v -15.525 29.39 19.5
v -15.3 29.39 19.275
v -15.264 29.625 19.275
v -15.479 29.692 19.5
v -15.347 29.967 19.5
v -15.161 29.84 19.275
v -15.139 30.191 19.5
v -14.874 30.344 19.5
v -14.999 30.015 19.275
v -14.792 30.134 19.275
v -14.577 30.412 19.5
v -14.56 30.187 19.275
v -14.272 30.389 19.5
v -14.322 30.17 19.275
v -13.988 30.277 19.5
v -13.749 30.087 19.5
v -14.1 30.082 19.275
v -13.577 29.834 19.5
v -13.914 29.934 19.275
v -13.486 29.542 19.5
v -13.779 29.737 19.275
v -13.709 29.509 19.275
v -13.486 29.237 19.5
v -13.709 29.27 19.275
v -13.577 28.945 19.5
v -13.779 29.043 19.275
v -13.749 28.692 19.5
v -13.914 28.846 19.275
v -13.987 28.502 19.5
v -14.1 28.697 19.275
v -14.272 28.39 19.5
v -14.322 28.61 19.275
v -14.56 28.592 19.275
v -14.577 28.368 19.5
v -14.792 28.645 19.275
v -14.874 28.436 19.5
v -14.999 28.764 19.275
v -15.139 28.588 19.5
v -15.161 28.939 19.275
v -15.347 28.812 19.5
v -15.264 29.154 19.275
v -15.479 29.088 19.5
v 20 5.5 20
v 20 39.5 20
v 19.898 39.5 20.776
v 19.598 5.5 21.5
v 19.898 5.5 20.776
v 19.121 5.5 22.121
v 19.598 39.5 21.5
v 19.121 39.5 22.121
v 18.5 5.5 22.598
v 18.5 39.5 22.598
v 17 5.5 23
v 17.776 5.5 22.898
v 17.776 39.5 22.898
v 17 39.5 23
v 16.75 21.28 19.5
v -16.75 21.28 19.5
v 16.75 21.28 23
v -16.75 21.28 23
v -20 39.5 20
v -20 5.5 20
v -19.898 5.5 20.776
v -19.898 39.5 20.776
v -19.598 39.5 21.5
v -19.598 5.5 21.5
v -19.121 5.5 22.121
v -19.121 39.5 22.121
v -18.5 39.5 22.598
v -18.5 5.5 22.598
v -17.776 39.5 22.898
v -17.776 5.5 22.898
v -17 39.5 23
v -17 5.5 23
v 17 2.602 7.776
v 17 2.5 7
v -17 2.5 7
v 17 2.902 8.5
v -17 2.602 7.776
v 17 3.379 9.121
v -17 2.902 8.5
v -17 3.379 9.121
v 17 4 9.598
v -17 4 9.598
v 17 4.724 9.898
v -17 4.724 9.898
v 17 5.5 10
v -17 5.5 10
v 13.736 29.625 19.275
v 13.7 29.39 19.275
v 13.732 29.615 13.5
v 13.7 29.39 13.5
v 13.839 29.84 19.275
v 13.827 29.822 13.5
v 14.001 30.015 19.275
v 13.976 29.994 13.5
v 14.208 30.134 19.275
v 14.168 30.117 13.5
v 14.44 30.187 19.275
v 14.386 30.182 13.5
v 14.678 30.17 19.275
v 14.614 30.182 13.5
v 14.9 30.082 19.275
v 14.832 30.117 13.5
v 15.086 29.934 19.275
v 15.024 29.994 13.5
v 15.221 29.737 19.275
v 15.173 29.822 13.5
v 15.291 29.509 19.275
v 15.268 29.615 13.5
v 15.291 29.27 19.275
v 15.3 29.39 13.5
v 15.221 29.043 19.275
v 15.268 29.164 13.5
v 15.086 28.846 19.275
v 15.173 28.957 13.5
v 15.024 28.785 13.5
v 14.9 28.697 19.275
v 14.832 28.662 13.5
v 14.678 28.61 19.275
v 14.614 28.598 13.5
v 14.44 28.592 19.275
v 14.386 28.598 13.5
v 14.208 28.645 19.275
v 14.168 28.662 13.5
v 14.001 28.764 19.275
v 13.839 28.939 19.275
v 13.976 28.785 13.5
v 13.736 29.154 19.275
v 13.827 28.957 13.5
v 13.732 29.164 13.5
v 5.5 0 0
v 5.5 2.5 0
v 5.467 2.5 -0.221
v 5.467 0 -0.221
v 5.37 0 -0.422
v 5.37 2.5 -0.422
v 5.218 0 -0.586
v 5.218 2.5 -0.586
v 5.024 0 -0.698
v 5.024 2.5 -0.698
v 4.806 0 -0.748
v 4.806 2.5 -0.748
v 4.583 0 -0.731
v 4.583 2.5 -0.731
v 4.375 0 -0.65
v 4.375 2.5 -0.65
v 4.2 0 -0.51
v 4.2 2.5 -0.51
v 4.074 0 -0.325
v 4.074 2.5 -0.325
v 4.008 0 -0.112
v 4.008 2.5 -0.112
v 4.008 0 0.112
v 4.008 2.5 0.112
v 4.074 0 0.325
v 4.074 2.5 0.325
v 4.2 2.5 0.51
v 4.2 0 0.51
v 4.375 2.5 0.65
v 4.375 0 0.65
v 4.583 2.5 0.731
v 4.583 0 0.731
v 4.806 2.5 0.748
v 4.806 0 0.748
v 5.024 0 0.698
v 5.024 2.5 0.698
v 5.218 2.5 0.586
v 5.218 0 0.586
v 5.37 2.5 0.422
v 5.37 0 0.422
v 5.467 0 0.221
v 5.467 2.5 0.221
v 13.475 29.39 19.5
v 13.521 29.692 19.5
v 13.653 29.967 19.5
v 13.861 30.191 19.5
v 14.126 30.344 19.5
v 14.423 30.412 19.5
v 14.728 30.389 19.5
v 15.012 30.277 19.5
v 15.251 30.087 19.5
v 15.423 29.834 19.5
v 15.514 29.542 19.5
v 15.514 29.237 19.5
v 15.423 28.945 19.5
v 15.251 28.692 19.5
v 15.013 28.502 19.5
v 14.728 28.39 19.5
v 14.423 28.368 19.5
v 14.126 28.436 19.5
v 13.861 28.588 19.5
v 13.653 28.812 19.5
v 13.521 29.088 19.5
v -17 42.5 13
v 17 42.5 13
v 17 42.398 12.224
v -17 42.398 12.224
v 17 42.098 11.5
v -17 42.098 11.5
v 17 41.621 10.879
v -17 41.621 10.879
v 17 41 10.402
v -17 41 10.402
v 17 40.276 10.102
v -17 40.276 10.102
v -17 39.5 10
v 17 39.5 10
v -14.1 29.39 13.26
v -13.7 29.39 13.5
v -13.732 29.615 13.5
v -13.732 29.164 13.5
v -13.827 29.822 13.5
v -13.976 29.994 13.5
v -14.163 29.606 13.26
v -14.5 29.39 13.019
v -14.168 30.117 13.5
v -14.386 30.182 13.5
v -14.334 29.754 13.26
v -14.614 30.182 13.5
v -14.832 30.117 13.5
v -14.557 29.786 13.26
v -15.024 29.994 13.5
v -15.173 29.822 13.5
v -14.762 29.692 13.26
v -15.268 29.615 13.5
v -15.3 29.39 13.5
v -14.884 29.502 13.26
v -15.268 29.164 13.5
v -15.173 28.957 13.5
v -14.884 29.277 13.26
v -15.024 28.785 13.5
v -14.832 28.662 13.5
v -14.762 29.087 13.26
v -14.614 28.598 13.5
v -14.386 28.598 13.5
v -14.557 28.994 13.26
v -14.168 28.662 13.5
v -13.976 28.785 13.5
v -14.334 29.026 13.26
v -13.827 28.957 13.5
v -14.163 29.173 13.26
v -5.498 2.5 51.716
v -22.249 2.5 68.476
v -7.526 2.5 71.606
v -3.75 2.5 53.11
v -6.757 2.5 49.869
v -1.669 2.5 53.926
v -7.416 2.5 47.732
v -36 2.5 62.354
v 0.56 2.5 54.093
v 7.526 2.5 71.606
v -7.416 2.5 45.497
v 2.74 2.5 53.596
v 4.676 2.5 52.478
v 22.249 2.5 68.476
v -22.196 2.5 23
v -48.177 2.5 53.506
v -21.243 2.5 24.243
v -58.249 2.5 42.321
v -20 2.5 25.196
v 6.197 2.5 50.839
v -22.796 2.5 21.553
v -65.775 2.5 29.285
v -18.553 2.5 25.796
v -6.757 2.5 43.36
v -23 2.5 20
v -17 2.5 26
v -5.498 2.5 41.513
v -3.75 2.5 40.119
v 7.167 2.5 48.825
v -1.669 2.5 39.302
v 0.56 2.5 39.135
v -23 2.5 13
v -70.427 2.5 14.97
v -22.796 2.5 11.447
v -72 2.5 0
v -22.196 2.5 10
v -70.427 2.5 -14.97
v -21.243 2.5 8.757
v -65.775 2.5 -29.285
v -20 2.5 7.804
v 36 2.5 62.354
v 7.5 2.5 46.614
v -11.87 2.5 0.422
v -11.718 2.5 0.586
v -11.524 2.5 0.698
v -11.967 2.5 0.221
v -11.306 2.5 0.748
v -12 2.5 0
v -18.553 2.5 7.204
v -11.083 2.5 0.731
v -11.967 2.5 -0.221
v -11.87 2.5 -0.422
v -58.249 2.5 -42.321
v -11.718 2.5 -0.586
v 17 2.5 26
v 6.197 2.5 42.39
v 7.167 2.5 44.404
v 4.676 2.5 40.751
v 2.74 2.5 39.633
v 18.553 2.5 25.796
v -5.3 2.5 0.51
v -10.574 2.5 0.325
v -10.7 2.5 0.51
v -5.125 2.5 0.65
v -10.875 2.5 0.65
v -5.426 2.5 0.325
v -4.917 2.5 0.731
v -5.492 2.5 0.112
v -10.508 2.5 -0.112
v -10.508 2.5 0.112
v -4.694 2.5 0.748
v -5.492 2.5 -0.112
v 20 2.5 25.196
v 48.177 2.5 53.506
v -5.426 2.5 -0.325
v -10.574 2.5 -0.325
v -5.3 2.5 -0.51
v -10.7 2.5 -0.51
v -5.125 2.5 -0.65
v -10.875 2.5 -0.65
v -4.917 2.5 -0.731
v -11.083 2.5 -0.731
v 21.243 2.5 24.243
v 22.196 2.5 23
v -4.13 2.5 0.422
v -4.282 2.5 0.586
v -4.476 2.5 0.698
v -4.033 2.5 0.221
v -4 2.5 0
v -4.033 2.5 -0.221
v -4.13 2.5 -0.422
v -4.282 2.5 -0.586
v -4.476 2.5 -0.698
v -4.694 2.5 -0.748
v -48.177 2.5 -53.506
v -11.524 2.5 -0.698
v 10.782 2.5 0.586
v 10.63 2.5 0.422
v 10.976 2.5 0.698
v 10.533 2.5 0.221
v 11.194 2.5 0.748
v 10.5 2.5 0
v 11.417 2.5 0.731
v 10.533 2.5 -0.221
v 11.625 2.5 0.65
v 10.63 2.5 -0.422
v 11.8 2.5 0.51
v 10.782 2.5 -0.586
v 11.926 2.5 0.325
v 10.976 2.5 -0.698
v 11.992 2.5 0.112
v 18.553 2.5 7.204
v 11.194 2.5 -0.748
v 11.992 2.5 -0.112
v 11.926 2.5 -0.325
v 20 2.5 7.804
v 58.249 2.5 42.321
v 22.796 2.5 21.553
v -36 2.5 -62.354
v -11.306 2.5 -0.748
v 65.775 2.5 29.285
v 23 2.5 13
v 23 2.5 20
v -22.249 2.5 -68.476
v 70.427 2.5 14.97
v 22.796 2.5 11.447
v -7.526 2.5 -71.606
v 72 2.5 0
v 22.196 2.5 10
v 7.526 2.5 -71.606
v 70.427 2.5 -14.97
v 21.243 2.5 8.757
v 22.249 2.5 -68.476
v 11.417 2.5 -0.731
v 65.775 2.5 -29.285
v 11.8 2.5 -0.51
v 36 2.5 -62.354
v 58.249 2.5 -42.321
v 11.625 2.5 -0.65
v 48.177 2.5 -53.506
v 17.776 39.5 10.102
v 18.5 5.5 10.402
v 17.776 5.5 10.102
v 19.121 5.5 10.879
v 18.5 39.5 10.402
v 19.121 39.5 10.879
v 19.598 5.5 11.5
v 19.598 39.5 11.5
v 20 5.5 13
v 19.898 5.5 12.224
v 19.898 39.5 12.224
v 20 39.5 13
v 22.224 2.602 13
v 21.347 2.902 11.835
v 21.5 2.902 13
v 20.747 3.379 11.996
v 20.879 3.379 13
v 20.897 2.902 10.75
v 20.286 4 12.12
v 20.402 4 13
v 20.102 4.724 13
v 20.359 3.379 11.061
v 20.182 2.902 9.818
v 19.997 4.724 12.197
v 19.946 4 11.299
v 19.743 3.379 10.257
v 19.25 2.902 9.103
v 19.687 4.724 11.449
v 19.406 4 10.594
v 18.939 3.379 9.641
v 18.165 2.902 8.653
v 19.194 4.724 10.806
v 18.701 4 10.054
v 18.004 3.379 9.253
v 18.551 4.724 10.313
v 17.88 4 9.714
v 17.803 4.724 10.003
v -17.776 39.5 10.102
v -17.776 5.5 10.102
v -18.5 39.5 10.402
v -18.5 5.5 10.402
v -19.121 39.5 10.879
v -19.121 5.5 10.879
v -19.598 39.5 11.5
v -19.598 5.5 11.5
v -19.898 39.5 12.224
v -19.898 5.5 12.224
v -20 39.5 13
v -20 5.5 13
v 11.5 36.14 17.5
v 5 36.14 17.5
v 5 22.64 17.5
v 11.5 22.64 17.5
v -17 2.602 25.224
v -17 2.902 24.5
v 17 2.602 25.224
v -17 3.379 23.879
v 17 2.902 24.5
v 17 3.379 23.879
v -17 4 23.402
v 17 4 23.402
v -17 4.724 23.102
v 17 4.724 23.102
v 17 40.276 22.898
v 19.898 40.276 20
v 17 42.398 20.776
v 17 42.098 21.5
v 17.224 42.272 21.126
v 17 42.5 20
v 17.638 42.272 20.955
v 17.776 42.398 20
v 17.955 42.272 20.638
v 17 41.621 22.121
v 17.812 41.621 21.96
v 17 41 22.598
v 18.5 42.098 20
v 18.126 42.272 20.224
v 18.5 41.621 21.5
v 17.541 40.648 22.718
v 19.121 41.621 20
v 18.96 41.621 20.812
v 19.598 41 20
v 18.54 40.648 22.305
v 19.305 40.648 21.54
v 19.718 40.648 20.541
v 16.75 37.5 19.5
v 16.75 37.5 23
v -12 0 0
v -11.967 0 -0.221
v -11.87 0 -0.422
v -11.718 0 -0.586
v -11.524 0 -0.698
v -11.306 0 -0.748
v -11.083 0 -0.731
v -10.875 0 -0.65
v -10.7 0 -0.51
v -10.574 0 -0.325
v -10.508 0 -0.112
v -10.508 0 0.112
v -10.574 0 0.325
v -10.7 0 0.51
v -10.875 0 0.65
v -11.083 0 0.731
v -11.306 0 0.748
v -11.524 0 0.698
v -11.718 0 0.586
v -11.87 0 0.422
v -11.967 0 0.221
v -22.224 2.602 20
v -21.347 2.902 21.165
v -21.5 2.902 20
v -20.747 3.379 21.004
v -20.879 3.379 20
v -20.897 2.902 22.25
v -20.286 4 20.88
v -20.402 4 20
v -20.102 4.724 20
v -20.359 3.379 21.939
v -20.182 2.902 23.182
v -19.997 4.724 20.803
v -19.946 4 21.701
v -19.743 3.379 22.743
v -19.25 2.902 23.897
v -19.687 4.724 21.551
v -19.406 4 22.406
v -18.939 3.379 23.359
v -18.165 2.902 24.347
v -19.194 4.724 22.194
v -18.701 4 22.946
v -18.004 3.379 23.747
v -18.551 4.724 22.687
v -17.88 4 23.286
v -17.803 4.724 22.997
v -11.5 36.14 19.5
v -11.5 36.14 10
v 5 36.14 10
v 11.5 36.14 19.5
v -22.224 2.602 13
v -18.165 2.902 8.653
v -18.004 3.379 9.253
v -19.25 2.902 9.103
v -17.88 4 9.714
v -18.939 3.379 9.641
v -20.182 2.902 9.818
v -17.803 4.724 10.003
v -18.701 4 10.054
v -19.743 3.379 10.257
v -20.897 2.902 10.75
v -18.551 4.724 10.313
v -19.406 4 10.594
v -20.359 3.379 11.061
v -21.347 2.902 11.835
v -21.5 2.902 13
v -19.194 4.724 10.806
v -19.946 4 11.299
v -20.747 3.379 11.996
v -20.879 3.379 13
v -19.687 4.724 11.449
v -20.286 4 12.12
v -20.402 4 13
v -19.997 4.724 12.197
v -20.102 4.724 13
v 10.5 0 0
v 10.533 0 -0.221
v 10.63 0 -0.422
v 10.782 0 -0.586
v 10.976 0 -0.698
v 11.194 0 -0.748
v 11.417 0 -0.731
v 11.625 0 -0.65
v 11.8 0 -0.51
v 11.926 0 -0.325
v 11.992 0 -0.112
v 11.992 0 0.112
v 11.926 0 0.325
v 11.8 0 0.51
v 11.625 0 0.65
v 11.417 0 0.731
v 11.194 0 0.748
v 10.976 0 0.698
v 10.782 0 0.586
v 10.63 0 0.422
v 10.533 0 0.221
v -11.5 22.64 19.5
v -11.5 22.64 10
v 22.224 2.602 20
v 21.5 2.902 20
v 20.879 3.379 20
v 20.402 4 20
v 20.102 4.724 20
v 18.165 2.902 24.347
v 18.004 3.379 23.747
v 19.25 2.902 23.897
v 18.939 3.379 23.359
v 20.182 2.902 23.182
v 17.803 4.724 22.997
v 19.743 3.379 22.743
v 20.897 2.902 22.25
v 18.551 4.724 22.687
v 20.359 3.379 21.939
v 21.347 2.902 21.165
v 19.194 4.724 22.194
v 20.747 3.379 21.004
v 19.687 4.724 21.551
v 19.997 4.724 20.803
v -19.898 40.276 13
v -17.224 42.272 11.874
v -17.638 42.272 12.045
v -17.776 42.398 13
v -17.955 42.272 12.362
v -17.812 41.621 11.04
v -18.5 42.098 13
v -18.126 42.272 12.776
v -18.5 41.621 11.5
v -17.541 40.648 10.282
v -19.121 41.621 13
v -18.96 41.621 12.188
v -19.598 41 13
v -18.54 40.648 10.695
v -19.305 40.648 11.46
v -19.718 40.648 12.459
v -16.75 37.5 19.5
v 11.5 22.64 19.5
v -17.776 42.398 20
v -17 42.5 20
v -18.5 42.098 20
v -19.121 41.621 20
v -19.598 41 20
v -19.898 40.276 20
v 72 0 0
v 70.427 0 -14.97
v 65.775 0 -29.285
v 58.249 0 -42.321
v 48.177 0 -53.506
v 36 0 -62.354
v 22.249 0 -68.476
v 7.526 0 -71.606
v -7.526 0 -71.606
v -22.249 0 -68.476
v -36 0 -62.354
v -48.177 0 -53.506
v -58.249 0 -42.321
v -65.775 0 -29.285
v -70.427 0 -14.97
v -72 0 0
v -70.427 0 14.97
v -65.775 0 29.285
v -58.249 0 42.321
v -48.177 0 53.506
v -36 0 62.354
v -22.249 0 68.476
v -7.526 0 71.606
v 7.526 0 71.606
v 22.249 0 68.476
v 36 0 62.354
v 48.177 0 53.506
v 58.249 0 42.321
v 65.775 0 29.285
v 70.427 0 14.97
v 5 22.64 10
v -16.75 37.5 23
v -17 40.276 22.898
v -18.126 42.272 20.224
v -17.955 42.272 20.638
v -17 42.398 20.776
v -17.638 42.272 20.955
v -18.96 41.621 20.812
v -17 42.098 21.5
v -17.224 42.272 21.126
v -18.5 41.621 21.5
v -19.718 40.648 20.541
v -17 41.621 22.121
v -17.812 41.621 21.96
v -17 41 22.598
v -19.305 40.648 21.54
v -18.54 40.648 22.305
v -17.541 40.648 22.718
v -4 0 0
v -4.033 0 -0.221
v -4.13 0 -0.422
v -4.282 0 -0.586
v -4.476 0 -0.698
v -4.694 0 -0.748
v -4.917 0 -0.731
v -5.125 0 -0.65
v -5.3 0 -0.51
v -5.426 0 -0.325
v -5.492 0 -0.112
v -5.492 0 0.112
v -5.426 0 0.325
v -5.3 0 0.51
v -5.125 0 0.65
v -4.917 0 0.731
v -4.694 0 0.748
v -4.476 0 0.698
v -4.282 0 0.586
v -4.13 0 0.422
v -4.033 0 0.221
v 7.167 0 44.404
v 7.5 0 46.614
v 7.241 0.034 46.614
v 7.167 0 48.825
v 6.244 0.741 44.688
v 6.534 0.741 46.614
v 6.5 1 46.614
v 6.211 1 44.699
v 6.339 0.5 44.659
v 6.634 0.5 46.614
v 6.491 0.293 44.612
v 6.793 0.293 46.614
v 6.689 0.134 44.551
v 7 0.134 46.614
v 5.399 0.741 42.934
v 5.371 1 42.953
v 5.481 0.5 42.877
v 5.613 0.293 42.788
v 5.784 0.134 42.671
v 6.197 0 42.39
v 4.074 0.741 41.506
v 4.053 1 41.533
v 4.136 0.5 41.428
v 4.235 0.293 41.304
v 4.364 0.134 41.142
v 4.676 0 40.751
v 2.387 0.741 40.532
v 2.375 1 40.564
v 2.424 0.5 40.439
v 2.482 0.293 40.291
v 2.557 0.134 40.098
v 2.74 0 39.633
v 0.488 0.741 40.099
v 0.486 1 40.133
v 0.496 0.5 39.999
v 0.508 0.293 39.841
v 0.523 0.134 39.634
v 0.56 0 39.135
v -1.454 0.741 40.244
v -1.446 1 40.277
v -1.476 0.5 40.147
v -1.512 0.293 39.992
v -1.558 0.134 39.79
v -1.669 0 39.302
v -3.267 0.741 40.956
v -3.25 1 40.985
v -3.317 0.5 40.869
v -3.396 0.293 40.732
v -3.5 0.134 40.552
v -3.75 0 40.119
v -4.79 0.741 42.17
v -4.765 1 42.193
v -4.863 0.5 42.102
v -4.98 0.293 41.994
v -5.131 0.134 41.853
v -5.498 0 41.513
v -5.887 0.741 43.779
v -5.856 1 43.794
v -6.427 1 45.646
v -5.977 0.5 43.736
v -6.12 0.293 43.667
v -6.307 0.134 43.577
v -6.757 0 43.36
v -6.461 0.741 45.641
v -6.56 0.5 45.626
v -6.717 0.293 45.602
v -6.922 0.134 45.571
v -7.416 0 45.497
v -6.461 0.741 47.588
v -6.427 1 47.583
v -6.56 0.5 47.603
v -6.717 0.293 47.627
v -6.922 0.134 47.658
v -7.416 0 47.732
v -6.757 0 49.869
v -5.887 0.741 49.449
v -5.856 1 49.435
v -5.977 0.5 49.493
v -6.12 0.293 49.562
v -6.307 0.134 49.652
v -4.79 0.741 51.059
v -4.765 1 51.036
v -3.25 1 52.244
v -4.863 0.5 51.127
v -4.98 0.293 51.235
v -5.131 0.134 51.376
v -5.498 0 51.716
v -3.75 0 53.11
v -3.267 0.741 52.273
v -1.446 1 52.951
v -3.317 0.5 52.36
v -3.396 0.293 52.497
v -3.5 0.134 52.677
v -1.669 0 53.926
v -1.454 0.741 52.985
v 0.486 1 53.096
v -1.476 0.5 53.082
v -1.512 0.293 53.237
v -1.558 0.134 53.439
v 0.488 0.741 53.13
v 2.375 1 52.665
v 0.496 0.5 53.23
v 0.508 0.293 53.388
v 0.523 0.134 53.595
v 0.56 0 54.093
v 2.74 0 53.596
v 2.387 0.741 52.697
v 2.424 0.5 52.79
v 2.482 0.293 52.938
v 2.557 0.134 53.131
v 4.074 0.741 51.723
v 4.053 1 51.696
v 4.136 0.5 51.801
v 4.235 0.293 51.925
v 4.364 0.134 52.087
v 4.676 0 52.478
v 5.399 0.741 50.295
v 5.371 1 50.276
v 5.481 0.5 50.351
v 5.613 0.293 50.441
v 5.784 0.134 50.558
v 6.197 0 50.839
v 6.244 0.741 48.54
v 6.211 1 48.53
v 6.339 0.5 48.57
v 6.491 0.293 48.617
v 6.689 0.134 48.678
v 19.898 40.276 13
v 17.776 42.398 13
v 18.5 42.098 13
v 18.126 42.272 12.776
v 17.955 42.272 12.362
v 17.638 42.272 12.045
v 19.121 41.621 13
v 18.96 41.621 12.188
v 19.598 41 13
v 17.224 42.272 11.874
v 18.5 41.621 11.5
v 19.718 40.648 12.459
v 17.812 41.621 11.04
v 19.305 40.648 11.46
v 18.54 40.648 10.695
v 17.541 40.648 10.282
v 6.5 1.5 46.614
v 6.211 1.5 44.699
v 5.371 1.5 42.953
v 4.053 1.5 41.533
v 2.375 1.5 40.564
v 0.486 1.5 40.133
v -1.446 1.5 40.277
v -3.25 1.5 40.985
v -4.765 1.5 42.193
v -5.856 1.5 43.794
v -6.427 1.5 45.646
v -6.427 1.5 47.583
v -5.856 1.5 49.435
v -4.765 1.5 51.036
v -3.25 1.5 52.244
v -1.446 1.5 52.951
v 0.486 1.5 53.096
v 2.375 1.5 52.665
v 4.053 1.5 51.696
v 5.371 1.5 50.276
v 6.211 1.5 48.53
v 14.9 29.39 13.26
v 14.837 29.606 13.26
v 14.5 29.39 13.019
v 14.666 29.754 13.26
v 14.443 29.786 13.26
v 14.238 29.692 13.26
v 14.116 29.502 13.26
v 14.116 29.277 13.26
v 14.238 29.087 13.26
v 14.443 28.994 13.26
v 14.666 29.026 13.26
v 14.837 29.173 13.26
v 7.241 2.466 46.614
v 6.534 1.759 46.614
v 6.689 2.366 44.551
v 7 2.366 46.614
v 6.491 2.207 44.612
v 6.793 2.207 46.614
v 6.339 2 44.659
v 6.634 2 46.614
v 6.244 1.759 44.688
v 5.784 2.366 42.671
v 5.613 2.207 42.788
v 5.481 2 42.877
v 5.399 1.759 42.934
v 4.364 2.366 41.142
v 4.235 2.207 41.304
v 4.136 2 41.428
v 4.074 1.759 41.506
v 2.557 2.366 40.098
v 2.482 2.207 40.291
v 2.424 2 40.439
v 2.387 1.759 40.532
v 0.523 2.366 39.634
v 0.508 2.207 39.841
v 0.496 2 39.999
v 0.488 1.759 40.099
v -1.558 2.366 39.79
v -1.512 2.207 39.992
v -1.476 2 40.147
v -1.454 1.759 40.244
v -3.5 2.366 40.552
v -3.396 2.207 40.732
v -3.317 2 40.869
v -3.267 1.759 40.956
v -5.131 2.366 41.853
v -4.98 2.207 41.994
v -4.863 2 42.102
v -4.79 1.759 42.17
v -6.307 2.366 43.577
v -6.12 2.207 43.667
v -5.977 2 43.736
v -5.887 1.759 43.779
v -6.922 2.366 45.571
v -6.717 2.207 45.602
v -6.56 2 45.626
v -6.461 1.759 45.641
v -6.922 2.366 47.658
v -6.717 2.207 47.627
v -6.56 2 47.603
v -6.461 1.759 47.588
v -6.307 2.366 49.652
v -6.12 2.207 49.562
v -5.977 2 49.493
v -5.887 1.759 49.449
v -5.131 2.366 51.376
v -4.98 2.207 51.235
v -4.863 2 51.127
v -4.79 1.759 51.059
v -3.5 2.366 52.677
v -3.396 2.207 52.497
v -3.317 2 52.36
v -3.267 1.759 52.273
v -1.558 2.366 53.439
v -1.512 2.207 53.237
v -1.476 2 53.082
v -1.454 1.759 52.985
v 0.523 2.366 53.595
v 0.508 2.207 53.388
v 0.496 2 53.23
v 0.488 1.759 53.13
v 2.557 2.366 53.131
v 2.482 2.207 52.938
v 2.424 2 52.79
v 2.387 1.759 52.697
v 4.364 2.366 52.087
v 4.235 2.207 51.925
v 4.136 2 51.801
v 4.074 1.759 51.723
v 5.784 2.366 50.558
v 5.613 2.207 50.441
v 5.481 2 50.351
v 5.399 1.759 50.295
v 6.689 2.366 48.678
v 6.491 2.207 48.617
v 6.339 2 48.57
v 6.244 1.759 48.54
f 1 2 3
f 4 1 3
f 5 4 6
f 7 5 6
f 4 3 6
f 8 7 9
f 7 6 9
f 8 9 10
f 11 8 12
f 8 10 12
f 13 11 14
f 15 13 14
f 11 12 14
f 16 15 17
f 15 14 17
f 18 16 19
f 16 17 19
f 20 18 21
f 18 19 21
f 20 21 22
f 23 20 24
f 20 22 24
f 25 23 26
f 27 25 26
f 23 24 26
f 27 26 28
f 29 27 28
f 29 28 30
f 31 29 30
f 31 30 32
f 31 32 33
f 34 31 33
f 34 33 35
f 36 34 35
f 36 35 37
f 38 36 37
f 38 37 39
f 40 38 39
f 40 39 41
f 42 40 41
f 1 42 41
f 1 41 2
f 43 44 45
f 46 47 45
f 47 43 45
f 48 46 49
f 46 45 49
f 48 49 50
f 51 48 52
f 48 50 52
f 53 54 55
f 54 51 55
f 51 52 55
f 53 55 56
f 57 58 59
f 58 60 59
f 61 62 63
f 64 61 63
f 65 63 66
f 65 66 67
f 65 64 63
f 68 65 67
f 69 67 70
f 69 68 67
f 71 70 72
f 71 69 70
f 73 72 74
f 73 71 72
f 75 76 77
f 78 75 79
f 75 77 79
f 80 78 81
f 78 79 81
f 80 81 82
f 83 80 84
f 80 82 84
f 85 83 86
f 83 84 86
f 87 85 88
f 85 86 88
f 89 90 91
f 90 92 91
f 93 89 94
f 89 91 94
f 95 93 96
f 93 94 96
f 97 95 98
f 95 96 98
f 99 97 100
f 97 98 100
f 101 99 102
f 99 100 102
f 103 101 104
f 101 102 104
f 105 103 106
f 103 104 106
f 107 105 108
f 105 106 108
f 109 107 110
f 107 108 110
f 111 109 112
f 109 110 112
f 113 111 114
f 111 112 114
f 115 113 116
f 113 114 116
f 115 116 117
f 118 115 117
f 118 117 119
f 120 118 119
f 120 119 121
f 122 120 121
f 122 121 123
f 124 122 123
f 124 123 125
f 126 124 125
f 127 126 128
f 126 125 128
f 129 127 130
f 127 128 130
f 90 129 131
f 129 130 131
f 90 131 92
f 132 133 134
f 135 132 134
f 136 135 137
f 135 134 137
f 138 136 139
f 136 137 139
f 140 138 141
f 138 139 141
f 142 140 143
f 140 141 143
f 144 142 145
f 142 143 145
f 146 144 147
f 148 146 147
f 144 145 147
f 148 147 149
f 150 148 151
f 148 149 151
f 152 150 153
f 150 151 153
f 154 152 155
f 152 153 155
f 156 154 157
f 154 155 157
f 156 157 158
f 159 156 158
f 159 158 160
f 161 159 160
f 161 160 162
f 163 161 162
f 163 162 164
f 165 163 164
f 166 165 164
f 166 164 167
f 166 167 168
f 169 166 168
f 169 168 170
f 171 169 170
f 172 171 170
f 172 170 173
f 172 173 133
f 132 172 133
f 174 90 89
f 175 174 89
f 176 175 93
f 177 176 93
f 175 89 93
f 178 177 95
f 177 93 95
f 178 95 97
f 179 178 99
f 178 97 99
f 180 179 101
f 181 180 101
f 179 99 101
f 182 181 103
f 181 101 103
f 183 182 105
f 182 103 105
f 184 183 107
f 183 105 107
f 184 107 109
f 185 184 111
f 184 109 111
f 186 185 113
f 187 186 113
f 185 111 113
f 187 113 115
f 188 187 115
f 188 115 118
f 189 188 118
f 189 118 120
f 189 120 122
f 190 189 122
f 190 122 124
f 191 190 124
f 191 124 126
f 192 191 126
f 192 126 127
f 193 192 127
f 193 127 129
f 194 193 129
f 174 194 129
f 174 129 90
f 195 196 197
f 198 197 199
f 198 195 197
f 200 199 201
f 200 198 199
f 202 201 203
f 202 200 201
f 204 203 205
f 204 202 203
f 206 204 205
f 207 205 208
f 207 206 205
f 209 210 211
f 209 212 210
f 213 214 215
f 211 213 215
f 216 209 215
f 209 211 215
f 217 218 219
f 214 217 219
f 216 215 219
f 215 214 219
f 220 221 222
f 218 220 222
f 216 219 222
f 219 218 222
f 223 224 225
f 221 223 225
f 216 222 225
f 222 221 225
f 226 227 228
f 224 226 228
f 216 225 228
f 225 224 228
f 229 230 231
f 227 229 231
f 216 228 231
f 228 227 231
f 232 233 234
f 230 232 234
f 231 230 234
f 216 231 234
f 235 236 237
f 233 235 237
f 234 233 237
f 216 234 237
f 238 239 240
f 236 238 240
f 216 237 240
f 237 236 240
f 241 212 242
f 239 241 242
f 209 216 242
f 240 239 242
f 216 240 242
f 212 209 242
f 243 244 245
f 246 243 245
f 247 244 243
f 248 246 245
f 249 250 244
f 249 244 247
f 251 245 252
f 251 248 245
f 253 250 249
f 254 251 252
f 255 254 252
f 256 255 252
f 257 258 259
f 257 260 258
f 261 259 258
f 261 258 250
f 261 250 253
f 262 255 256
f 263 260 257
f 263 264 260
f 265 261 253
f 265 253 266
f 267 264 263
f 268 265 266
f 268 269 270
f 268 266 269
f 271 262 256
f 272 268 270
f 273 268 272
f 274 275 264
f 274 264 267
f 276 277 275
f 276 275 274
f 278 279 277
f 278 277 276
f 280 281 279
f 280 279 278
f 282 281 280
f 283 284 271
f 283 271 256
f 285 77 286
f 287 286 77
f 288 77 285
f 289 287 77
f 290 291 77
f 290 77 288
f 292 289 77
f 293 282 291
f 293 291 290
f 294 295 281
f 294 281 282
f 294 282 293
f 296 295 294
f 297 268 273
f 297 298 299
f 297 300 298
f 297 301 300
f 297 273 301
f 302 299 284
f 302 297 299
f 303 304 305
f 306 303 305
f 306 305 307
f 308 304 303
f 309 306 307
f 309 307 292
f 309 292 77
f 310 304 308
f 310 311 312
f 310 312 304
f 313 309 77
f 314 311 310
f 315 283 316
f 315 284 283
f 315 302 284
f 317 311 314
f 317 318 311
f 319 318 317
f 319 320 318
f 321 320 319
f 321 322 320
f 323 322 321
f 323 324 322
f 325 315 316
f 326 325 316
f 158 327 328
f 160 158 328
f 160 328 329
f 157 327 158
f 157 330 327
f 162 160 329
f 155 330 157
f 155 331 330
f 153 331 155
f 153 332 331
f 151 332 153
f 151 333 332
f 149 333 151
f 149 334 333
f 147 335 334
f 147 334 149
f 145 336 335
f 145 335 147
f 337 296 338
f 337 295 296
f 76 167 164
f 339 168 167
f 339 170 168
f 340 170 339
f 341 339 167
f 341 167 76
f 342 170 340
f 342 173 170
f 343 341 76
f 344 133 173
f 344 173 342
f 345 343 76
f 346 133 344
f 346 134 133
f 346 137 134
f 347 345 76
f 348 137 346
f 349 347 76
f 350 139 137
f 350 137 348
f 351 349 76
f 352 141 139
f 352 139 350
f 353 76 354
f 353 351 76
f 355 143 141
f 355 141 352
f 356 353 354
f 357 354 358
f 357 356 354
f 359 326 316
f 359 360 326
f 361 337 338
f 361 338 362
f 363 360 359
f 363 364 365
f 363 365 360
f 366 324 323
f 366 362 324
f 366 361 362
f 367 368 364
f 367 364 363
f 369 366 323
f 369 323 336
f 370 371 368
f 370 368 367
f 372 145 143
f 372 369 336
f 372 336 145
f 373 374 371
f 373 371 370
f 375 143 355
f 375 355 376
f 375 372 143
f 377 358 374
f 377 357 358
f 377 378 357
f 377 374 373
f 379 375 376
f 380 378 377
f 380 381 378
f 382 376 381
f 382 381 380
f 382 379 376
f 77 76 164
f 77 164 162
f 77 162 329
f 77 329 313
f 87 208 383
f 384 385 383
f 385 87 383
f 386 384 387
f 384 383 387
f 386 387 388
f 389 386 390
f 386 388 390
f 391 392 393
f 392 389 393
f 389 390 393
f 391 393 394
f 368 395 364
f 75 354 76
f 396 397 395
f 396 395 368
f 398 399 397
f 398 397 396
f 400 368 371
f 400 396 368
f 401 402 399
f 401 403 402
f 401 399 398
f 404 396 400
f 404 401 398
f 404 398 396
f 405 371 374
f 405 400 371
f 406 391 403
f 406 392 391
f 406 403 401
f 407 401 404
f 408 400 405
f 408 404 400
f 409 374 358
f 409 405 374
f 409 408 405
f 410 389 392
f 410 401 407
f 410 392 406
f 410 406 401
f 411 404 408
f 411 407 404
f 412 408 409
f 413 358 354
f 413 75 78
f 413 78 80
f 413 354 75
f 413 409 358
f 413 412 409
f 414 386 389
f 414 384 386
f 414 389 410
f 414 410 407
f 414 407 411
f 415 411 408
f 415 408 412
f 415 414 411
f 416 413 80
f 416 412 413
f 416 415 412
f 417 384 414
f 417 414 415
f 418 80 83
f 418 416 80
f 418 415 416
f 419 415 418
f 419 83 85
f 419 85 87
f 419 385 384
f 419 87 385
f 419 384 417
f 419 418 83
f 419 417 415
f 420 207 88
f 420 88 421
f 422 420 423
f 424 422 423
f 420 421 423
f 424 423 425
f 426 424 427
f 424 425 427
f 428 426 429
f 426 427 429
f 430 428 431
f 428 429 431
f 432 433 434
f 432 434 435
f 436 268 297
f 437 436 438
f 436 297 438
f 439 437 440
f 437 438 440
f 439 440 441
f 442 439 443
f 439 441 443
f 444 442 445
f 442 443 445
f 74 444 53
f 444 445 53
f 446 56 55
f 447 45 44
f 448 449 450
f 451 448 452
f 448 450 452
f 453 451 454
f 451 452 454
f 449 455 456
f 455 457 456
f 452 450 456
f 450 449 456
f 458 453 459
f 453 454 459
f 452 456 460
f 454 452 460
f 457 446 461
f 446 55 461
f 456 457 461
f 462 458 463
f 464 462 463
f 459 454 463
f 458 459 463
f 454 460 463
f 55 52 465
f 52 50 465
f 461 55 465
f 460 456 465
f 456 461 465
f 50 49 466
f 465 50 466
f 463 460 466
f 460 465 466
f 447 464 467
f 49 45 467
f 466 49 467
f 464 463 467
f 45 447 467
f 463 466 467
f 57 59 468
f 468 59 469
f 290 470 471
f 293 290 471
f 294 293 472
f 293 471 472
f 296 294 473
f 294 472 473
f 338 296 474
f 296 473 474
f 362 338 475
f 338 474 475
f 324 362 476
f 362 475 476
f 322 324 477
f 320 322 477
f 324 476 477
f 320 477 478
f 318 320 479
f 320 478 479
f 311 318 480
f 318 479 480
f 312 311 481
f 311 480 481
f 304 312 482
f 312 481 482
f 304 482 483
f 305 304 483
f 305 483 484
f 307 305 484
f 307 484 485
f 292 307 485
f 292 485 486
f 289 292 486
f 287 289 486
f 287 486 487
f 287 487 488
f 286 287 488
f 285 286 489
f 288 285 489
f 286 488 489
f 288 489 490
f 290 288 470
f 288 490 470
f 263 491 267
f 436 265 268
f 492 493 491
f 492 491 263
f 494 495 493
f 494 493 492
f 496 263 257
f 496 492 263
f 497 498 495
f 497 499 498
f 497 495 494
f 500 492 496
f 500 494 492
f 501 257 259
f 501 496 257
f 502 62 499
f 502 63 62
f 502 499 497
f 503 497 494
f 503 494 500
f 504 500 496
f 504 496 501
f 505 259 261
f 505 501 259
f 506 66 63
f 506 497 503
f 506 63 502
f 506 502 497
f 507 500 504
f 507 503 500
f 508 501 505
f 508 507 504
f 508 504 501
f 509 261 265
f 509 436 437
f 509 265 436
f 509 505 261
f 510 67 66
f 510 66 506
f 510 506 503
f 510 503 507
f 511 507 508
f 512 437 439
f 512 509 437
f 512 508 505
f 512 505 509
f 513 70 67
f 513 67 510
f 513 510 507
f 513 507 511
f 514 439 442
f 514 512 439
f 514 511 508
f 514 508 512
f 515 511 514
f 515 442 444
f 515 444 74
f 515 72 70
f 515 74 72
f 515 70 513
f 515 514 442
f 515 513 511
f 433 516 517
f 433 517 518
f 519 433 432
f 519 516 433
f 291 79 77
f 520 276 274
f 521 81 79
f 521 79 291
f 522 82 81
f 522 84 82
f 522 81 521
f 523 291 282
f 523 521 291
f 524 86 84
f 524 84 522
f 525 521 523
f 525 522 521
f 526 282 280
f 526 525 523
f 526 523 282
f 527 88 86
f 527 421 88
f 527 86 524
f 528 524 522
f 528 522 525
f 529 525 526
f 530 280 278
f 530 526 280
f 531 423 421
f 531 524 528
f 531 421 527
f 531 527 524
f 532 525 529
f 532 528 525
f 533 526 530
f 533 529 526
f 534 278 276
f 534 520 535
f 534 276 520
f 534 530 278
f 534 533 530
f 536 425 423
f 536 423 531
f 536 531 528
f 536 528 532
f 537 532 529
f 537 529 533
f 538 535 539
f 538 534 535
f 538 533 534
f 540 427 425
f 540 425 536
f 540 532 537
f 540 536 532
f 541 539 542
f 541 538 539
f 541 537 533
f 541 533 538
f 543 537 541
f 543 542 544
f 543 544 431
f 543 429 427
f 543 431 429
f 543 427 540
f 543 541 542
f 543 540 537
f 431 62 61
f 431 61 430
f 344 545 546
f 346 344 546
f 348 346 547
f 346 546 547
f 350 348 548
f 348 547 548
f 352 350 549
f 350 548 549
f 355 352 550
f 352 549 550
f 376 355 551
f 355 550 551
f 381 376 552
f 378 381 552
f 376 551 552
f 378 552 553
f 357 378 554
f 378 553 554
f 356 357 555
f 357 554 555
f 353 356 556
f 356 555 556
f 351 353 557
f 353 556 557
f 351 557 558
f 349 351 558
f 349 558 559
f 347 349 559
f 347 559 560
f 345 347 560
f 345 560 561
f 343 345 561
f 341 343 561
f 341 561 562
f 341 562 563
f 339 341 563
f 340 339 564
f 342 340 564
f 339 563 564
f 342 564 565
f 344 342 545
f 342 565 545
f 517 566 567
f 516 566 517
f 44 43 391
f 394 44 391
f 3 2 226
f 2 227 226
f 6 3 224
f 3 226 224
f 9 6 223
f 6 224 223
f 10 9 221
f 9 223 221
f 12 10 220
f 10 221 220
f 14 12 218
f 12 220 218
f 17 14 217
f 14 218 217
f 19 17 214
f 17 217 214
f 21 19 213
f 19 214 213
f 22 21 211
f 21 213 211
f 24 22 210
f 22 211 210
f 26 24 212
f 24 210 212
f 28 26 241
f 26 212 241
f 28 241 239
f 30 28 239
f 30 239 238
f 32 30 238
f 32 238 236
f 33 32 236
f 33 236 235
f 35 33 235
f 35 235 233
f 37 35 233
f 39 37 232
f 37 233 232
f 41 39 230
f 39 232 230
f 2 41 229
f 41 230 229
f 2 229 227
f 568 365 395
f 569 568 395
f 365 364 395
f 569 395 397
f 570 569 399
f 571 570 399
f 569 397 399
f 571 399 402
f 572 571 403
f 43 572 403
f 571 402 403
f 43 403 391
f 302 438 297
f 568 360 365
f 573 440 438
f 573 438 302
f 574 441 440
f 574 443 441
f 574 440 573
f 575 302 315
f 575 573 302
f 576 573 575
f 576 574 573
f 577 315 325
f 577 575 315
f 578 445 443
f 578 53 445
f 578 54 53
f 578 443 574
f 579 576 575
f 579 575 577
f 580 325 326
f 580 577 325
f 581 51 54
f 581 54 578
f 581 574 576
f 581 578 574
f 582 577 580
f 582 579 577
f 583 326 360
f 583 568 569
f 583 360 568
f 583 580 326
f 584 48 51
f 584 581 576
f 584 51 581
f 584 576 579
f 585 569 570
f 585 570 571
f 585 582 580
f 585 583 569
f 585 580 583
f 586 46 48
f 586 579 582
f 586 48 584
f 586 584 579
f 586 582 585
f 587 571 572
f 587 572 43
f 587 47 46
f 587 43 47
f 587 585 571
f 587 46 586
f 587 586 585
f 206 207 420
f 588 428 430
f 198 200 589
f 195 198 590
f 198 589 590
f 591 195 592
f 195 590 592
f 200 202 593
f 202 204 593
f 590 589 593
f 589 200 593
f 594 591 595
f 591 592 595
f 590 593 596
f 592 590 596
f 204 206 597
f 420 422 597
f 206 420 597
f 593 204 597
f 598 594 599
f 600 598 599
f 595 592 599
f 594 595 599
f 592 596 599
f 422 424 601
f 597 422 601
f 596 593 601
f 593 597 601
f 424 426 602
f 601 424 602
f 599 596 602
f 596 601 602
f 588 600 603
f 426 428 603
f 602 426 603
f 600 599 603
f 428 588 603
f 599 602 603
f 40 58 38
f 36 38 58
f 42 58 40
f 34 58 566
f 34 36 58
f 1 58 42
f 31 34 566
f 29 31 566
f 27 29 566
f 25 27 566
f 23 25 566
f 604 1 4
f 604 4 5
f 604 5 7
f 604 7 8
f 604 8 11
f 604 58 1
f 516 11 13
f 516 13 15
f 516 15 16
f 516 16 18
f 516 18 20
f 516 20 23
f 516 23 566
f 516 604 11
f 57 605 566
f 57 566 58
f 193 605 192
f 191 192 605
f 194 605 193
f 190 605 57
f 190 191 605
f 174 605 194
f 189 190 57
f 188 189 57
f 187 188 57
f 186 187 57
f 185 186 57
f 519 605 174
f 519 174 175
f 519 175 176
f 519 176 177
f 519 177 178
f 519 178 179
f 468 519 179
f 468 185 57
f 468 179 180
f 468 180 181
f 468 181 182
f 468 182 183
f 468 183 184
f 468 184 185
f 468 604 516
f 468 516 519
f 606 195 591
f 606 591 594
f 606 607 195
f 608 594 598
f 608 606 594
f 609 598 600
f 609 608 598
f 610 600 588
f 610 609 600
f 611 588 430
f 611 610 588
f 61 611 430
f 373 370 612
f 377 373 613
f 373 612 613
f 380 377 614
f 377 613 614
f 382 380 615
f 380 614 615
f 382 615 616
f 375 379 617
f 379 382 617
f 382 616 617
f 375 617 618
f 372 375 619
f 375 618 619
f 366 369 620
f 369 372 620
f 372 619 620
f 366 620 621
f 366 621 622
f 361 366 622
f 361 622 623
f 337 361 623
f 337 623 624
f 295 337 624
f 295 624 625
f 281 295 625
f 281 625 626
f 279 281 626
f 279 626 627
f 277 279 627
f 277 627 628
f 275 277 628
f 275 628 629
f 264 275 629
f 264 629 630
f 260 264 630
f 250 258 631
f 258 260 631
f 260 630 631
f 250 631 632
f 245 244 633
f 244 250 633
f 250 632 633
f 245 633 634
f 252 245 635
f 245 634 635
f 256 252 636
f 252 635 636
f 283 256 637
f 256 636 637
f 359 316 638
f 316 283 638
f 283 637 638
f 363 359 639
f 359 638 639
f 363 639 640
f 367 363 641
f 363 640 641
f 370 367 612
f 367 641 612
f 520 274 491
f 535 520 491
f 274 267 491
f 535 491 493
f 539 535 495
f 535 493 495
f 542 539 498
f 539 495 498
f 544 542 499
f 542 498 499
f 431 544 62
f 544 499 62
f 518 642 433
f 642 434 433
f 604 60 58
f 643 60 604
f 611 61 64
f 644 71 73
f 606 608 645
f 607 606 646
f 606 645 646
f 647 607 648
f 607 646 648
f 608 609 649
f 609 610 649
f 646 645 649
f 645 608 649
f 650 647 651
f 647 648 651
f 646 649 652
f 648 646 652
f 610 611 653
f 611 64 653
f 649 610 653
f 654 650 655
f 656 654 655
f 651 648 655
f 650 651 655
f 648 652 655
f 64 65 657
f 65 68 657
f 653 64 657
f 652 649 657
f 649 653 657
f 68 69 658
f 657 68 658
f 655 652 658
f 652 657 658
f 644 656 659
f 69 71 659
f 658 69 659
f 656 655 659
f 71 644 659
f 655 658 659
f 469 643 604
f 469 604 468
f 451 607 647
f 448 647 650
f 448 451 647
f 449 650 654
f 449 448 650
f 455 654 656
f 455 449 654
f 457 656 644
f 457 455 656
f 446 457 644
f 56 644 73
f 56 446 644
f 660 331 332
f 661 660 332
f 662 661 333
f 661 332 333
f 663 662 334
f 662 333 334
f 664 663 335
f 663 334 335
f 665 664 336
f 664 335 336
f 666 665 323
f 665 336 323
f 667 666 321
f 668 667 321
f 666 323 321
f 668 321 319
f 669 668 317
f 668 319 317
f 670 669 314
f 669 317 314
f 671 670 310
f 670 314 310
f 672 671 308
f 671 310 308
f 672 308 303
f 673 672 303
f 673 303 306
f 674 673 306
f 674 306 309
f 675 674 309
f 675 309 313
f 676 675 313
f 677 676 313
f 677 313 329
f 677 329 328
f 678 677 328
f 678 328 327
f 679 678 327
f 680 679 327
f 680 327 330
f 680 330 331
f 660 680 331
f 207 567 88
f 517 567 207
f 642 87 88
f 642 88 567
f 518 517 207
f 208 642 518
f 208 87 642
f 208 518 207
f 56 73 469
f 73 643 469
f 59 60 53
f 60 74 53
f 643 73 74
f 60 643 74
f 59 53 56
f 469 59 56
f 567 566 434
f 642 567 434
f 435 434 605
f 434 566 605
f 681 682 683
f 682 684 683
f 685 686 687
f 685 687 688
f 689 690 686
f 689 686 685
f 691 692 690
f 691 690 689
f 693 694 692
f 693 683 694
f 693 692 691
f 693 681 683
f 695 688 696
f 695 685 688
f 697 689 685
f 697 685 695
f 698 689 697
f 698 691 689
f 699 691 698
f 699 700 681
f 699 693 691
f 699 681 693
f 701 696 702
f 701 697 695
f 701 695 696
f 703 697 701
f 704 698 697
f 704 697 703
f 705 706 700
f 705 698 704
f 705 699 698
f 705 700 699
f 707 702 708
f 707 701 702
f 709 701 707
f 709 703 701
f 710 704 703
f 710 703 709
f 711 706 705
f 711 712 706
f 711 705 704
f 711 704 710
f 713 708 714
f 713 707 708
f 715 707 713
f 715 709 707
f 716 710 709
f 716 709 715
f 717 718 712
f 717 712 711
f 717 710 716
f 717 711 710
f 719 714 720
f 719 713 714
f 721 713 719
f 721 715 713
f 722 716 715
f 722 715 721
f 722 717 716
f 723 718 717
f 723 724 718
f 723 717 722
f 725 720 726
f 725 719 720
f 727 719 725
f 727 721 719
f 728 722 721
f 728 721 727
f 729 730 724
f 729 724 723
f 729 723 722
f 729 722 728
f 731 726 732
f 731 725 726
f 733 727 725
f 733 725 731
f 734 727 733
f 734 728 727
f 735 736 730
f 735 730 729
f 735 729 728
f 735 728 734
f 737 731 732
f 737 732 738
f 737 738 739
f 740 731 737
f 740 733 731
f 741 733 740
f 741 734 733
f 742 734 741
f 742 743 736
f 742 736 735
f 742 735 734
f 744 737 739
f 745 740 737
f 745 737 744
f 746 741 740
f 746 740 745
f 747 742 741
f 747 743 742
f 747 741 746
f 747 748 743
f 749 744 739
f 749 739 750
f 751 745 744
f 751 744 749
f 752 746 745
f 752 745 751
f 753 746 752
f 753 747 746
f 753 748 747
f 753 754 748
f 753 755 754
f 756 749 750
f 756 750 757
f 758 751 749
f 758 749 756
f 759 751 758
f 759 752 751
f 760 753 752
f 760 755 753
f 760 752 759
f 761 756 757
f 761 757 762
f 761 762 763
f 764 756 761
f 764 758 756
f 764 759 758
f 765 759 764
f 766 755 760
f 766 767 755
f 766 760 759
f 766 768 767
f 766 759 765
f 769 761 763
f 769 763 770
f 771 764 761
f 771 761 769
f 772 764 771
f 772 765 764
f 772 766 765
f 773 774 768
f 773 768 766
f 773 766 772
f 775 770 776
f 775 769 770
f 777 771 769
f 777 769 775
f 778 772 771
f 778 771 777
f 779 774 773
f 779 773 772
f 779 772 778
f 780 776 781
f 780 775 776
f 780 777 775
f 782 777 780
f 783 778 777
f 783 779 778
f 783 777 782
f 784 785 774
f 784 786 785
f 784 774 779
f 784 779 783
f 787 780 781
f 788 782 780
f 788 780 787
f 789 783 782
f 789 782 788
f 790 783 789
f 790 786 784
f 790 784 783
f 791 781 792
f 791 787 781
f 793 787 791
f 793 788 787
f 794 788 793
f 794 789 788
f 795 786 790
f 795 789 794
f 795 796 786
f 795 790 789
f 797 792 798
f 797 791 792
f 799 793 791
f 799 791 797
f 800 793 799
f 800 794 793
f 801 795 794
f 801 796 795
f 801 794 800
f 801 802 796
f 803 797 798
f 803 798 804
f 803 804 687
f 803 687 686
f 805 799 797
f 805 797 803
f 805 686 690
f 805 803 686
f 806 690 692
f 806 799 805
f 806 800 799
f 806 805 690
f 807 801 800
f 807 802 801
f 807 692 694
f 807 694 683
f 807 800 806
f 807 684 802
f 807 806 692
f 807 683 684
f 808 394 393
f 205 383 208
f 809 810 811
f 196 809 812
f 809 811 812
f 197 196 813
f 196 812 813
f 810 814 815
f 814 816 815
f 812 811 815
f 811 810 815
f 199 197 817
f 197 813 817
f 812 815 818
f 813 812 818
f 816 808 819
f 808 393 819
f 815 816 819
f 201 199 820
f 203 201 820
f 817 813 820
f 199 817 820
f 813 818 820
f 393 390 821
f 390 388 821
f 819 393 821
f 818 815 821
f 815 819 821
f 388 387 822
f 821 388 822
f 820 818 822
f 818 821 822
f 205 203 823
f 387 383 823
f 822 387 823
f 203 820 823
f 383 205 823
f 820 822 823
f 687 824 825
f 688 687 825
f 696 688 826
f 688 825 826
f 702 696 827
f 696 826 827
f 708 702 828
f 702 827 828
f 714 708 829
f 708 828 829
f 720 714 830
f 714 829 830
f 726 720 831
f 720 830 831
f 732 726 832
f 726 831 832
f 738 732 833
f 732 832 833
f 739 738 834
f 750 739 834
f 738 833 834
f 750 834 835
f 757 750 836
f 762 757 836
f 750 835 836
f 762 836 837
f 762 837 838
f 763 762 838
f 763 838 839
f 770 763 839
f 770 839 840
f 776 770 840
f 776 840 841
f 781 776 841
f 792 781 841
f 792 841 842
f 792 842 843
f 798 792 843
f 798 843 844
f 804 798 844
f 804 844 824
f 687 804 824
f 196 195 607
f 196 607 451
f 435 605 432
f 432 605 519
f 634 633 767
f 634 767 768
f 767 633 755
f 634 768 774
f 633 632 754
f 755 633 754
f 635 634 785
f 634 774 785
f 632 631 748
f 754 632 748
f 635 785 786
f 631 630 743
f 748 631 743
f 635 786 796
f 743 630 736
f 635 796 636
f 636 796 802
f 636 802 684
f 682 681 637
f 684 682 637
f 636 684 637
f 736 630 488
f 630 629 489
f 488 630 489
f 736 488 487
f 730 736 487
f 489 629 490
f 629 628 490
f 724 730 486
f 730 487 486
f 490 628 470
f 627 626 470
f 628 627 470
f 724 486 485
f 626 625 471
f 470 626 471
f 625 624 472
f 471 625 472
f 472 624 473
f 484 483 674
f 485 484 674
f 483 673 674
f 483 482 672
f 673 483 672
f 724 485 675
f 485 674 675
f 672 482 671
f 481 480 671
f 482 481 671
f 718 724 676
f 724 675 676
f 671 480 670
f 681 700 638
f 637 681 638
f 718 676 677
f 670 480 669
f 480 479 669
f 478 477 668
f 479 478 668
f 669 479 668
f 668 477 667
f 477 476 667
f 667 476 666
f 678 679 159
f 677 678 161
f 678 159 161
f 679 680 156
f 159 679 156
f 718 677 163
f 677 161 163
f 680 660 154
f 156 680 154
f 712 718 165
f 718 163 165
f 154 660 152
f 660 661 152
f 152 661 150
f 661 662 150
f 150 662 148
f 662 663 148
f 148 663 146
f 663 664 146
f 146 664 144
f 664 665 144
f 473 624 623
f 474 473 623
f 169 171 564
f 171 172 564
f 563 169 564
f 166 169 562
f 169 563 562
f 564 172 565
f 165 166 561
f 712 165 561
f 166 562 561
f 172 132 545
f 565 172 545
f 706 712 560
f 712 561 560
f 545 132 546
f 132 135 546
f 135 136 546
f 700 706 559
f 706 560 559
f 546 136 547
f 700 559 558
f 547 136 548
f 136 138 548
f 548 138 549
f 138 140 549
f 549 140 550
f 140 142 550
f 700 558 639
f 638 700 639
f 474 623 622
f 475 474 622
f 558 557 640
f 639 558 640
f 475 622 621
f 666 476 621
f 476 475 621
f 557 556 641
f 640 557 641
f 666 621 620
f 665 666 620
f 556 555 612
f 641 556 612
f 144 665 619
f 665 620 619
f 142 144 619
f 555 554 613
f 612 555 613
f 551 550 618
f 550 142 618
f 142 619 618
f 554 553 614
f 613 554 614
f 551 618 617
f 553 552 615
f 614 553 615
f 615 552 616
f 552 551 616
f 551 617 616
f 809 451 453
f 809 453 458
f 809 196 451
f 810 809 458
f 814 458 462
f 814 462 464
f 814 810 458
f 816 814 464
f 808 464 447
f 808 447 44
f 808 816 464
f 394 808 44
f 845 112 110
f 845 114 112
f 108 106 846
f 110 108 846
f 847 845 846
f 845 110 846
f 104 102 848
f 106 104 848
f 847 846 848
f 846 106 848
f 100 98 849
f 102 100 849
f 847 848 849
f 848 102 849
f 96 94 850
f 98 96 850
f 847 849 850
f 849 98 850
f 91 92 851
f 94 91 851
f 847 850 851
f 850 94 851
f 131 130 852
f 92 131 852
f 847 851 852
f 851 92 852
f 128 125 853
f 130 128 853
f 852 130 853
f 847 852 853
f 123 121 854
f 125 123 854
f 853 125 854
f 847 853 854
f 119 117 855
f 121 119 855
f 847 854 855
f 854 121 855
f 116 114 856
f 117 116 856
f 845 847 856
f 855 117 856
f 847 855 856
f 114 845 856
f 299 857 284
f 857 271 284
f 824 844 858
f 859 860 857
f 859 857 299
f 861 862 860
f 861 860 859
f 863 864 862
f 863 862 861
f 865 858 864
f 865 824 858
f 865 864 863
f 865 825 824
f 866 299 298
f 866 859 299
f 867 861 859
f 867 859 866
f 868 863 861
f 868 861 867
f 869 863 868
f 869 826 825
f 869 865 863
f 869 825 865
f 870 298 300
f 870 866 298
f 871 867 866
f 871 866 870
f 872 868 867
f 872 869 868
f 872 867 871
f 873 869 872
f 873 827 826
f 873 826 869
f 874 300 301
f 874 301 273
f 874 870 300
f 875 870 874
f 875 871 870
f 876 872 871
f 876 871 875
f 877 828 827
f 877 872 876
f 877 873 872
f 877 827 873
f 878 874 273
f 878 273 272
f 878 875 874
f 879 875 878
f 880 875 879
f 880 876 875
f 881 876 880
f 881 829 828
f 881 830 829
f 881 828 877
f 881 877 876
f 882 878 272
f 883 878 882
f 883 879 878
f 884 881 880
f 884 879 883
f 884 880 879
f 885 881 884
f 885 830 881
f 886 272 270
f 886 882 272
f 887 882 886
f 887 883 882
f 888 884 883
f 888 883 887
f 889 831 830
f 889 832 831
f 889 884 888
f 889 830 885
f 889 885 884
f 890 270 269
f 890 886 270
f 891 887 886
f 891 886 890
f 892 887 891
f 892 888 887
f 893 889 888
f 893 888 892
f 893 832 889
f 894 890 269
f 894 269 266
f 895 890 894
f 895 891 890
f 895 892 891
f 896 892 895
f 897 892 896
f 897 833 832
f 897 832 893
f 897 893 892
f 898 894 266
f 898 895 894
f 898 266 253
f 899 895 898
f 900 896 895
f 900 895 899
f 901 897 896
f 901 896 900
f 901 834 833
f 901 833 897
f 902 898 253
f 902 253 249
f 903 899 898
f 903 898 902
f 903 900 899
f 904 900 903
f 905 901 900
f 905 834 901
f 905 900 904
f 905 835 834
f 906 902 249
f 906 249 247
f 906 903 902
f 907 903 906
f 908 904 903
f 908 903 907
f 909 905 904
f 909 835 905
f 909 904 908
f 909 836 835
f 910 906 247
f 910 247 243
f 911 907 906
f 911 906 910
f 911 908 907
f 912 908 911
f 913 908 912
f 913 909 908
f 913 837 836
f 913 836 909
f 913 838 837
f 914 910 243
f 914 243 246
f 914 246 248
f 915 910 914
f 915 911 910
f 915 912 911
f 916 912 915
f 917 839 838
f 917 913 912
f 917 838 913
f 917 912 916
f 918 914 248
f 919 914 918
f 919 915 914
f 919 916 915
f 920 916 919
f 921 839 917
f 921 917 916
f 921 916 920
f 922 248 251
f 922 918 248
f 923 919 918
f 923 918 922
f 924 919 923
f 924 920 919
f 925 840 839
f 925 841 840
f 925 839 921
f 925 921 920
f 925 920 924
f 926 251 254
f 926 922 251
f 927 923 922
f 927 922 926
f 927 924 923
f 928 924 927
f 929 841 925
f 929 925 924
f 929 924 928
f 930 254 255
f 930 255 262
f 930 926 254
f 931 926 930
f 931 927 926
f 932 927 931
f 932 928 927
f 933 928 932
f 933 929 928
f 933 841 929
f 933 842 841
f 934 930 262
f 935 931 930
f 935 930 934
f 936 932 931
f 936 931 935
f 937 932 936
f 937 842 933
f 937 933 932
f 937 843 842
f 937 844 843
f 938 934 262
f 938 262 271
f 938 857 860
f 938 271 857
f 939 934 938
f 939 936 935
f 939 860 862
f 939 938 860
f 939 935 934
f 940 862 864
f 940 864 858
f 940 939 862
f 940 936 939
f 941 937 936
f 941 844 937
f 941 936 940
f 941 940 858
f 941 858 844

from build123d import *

# Parameters (mm, degrees)
SKETCH1_R                       = 72
BOSS_EXTRUDE1_DEPTH             = 2.5
SKETCH2_R                       = 0.75
CUT_EXTRUDE1_DEPTH              = 2.5
SKETCH5_W                       = 40
SKETCH5_H                       = 18
BOSS_EXTRUDE3_DEPTH             = 40
SKETCH6_W                       = 33.5
SKETCH6_H                       = 16.220064856
CUT_EXTRUDE2_DEPTH              = 3.5
SKETCH7_W                       = 23
SKETCH7_H                       = 16.220064856
CUT_EXTRUDE3_DEPTH              = 2
SKETCH8_W                       = 16.5
SKETCH8_H                       = 16.220064856
CUT_EXTRUDE4_DEPTH              = 7
SKETCH9_W                       = 5
SKETCH9_H                       = 40
CUT_EXTRUDE5_DEPTH              = 93
SKETCH10_W                      = 16.5
SKETCH10_H                      = 16.220064856
CUT_EXTRUDE6_DEPTH              = 83.5
SKETCH13_W                      = 33.5
SKETCH13_H                      = 1.36
BOSS_EXTRUDE4_DEPTH             = 9.5
M2X0_4_TAPPED_HOLE1_D           = 1.6
M2X0_4_TAPPED_HOLE1_DEPTH       = 6
M2X0_4_TAPPED_HOLE1_CSINK_D     = 2.05
M2X0_4_TAPPED_HOLE1_CSINK_ANGLE = 90
M2X0_4_TAPPED_HOLE1_TIP         = 0.480688495
FILLET1_R                       = 3
FILLET2_R                       = 3
FILLET3_R                       = 3
SKETCH16_R                      = 6.5
CUT_EXTRUDE7_DEPTH              = 3.5
FILLET4_R                       = 1
SKETCH17_R                      = 0.75
CUT_EXTRUDE8_DEPTH              = 3.5


with BuildPart() as part:
    # Sketch1 → Boss-Extrude1 (new body)
    with BuildSketch(Plane(origin=(0, 0, 0), x_dir=(1, 0, 0), z_dir=(0, 1, 0))):
        Circle(SKETCH1_R)
    extrude(amount=BOSS_EXTRUDE1_DEPTH)

    # Sketch2 → Cut-Extrude1 (cut)
    with BuildSketch(Plane(origin=(0, 0, 0), x_dir=(-1, 0, 0), z_dir=(0, -1, 0))):
        with Locations((-11.25, 0)):
            Circle(SKETCH2_R)
        with Locations((11.25, 0)):
            Circle(SKETCH2_R)
    extrude(amount=-CUT_EXTRUDE1_DEPTH, mode=Mode.SUBTRACT)

    # Sketch5 → Boss-Extrude3 (add)
    with BuildSketch(Plane(origin=(0, 2.5, 0), x_dir=(1, 0, 0), z_dir=(0, 1, 0))):
        with Locations((0, -14)):
            Rectangle(SKETCH5_W, SKETCH5_H)
    extrude(amount=BOSS_EXTRUDE3_DEPTH)

    # Sketch6 → Cut-Extrude2 (cut)
    with BuildSketch(Plane.XY.offset(23)):
        with Locations((0, 29.389629851)):
            Rectangle(SKETCH6_W, SKETCH6_H)
    extrude(amount=-CUT_EXTRUDE2_DEPTH, mode=Mode.SUBTRACT)

    # Sketch7 → Cut-Extrude3 (cut)
    with BuildSketch(Plane.XY.offset(19.5)):
        with Locations((0, 29.389629851)):
            Rectangle(SKETCH7_W, SKETCH7_H)
    extrude(amount=-CUT_EXTRUDE3_DEPTH, mode=Mode.SUBTRACT)

    # Sketch8 → Cut-Extrude4 (cut)
    with BuildSketch(Plane.XY.offset(17.5)):
        with Locations((-3.25, 29.389629851)):
            Rectangle(SKETCH8_W, SKETCH8_H)
    extrude(amount=-CUT_EXTRUDE4_DEPTH, mode=Mode.SUBTRACT)

    # Sketch9 → Cut-Extrude5 (cut, through all)
    with BuildSketch(Plane(origin=(20, 0, 0), x_dir=(0, 0, -1), z_dir=(1, 0, 0))):
        with Locations((-7.5, 22.5)):
            Rectangle(SKETCH9_W, SKETCH9_H)
    extrude(amount=-CUT_EXTRUDE5_DEPTH, mode=Mode.SUBTRACT)

    # Sketch10 → Cut-Extrude6 (cut, through all)
    with BuildSketch(Plane.XY.offset(10.5)):
        with Locations((-3.25, 29.389629851)):
            Rectangle(SKETCH10_W, SKETCH10_H)
    extrude(amount=-CUT_EXTRUDE6_DEPTH, mode=Mode.SUBTRACT)

    # Sketch13 → Boss-Extrude4 (add)
    with BuildSketch(Plane.XY.offset(19.5)):
        with Locations((0, 36.819662279)):
            Rectangle(SKETCH13_W, SKETCH13_H)
        with Locations((0, 21.959597423)):
            Rectangle(SKETCH13_W, SKETCH13_H)
    extrude(amount=-BOSS_EXTRUDE4_DEPTH)

    # M2x0.4 Tapped Hole1
    with Locations(Plane.XY.offset(19.5)):
        with Locations((14.5, 29.389662279), (-14.5, 29.389662279)):
            CounterSinkHole(M2X0_4_TAPPED_HOLE1_D / 2, M2X0_4_TAPPED_HOLE1_CSINK_D / 2, depth=M2X0_4_TAPPED_HOLE1_DEPTH, counter_sink_angle=M2X0_4_TAPPED_HOLE1_CSINK_ANGLE)
            with Locations((0, 0, -(M2X0_4_TAPPED_HOLE1_DEPTH + M2X0_4_TAPPED_HOLE1_TIP / 2))):  # 118° drill point
                Cone(0, M2X0_4_TAPPED_HOLE1_D / 2, M2X0_4_TAPPED_HOLE1_TIP, mode=Mode.SUBTRACT)

    # Fillet1
    fillet1_edges = [part.edges().sort_by_distance(p)[0] for p in [
        (-20, 22.5, 23),
        (20, 22.5, 23),
        (-20, 22.5, 10),
        (20, 22.5, 10),
    ]]
    fillet(fillet1_edges, radius=FILLET1_R)

    # Fillet2
    fillet2_edges = [part.edges().sort_by_distance(p)[0] for p in [
        (20, 2.5, 16.5),
        (0, 2.5, 23),
        (-20, 2.5, 16.5),
        (0, 2.5, 10),
        (19.121320344, 2.5, 22.121320344),
        (-19.121320344, 2.5, 22.121320344),
        (-19.121320344, 2.5, 10.878679656),
        (19.121320344, 2.5, 10.878679656),
    ]]
    fillet(fillet2_edges, radius=FILLET2_R)

    # Fillet3
    fillet3_edges = [part.edges().sort_by_distance(p)[0] for p in [
        (20, 42.5, 16.5),
        (0, 42.5, 23),
        (0, 42.5, 10),
        (-20, 42.5, 16.5),
        (19.121320344, 42.5, 10.878679656),
        (-19.121320344, 42.5, 10.878679656),
        (-19.121320344, 42.5, 22.121320344),
        (19.121320344, 42.5, 22.121320344),
    ]]
    fillet(fillet3_edges, radius=FILLET3_R)

    # Sketch16 → Cut-Extrude7 (cut, through all)
    with BuildSketch(Plane(origin=(0, 2.5, 0), x_dir=(1, 0, 0), z_dir=(0, 1, 0))):
        with Locations((0, -46.614420622)):
            Circle(SKETCH16_R)
    extrude(amount=-CUT_EXTRUDE7_DEPTH, mode=Mode.SUBTRACT)

    # Fillet4
    fillet4_edges = [part.edges().sort_by_distance(p)[0] for p in [
        (-6.5, 0, 46.614420622),
        (-6.5, 2.5, 46.614420622),
    ]]
    fillet(fillet4_edges, radius=FILLET4_R)

    # Sketch17 → Cut-Extrude8 (cut, through all)
    with BuildSketch(Plane(origin=(0, 2.5, 0), x_dir=(1, 0, 0), z_dir=(0, 1, 0))):
        with Locations((4.75, 0)):
            Circle(SKETCH17_R)
        with Locations((-4.75, 0)):
            Circle(SKETCH17_R)
    extrude(amount=-CUT_EXTRUDE8_DEPTH, mode=Mode.SUBTRACT)


solid = part.part
